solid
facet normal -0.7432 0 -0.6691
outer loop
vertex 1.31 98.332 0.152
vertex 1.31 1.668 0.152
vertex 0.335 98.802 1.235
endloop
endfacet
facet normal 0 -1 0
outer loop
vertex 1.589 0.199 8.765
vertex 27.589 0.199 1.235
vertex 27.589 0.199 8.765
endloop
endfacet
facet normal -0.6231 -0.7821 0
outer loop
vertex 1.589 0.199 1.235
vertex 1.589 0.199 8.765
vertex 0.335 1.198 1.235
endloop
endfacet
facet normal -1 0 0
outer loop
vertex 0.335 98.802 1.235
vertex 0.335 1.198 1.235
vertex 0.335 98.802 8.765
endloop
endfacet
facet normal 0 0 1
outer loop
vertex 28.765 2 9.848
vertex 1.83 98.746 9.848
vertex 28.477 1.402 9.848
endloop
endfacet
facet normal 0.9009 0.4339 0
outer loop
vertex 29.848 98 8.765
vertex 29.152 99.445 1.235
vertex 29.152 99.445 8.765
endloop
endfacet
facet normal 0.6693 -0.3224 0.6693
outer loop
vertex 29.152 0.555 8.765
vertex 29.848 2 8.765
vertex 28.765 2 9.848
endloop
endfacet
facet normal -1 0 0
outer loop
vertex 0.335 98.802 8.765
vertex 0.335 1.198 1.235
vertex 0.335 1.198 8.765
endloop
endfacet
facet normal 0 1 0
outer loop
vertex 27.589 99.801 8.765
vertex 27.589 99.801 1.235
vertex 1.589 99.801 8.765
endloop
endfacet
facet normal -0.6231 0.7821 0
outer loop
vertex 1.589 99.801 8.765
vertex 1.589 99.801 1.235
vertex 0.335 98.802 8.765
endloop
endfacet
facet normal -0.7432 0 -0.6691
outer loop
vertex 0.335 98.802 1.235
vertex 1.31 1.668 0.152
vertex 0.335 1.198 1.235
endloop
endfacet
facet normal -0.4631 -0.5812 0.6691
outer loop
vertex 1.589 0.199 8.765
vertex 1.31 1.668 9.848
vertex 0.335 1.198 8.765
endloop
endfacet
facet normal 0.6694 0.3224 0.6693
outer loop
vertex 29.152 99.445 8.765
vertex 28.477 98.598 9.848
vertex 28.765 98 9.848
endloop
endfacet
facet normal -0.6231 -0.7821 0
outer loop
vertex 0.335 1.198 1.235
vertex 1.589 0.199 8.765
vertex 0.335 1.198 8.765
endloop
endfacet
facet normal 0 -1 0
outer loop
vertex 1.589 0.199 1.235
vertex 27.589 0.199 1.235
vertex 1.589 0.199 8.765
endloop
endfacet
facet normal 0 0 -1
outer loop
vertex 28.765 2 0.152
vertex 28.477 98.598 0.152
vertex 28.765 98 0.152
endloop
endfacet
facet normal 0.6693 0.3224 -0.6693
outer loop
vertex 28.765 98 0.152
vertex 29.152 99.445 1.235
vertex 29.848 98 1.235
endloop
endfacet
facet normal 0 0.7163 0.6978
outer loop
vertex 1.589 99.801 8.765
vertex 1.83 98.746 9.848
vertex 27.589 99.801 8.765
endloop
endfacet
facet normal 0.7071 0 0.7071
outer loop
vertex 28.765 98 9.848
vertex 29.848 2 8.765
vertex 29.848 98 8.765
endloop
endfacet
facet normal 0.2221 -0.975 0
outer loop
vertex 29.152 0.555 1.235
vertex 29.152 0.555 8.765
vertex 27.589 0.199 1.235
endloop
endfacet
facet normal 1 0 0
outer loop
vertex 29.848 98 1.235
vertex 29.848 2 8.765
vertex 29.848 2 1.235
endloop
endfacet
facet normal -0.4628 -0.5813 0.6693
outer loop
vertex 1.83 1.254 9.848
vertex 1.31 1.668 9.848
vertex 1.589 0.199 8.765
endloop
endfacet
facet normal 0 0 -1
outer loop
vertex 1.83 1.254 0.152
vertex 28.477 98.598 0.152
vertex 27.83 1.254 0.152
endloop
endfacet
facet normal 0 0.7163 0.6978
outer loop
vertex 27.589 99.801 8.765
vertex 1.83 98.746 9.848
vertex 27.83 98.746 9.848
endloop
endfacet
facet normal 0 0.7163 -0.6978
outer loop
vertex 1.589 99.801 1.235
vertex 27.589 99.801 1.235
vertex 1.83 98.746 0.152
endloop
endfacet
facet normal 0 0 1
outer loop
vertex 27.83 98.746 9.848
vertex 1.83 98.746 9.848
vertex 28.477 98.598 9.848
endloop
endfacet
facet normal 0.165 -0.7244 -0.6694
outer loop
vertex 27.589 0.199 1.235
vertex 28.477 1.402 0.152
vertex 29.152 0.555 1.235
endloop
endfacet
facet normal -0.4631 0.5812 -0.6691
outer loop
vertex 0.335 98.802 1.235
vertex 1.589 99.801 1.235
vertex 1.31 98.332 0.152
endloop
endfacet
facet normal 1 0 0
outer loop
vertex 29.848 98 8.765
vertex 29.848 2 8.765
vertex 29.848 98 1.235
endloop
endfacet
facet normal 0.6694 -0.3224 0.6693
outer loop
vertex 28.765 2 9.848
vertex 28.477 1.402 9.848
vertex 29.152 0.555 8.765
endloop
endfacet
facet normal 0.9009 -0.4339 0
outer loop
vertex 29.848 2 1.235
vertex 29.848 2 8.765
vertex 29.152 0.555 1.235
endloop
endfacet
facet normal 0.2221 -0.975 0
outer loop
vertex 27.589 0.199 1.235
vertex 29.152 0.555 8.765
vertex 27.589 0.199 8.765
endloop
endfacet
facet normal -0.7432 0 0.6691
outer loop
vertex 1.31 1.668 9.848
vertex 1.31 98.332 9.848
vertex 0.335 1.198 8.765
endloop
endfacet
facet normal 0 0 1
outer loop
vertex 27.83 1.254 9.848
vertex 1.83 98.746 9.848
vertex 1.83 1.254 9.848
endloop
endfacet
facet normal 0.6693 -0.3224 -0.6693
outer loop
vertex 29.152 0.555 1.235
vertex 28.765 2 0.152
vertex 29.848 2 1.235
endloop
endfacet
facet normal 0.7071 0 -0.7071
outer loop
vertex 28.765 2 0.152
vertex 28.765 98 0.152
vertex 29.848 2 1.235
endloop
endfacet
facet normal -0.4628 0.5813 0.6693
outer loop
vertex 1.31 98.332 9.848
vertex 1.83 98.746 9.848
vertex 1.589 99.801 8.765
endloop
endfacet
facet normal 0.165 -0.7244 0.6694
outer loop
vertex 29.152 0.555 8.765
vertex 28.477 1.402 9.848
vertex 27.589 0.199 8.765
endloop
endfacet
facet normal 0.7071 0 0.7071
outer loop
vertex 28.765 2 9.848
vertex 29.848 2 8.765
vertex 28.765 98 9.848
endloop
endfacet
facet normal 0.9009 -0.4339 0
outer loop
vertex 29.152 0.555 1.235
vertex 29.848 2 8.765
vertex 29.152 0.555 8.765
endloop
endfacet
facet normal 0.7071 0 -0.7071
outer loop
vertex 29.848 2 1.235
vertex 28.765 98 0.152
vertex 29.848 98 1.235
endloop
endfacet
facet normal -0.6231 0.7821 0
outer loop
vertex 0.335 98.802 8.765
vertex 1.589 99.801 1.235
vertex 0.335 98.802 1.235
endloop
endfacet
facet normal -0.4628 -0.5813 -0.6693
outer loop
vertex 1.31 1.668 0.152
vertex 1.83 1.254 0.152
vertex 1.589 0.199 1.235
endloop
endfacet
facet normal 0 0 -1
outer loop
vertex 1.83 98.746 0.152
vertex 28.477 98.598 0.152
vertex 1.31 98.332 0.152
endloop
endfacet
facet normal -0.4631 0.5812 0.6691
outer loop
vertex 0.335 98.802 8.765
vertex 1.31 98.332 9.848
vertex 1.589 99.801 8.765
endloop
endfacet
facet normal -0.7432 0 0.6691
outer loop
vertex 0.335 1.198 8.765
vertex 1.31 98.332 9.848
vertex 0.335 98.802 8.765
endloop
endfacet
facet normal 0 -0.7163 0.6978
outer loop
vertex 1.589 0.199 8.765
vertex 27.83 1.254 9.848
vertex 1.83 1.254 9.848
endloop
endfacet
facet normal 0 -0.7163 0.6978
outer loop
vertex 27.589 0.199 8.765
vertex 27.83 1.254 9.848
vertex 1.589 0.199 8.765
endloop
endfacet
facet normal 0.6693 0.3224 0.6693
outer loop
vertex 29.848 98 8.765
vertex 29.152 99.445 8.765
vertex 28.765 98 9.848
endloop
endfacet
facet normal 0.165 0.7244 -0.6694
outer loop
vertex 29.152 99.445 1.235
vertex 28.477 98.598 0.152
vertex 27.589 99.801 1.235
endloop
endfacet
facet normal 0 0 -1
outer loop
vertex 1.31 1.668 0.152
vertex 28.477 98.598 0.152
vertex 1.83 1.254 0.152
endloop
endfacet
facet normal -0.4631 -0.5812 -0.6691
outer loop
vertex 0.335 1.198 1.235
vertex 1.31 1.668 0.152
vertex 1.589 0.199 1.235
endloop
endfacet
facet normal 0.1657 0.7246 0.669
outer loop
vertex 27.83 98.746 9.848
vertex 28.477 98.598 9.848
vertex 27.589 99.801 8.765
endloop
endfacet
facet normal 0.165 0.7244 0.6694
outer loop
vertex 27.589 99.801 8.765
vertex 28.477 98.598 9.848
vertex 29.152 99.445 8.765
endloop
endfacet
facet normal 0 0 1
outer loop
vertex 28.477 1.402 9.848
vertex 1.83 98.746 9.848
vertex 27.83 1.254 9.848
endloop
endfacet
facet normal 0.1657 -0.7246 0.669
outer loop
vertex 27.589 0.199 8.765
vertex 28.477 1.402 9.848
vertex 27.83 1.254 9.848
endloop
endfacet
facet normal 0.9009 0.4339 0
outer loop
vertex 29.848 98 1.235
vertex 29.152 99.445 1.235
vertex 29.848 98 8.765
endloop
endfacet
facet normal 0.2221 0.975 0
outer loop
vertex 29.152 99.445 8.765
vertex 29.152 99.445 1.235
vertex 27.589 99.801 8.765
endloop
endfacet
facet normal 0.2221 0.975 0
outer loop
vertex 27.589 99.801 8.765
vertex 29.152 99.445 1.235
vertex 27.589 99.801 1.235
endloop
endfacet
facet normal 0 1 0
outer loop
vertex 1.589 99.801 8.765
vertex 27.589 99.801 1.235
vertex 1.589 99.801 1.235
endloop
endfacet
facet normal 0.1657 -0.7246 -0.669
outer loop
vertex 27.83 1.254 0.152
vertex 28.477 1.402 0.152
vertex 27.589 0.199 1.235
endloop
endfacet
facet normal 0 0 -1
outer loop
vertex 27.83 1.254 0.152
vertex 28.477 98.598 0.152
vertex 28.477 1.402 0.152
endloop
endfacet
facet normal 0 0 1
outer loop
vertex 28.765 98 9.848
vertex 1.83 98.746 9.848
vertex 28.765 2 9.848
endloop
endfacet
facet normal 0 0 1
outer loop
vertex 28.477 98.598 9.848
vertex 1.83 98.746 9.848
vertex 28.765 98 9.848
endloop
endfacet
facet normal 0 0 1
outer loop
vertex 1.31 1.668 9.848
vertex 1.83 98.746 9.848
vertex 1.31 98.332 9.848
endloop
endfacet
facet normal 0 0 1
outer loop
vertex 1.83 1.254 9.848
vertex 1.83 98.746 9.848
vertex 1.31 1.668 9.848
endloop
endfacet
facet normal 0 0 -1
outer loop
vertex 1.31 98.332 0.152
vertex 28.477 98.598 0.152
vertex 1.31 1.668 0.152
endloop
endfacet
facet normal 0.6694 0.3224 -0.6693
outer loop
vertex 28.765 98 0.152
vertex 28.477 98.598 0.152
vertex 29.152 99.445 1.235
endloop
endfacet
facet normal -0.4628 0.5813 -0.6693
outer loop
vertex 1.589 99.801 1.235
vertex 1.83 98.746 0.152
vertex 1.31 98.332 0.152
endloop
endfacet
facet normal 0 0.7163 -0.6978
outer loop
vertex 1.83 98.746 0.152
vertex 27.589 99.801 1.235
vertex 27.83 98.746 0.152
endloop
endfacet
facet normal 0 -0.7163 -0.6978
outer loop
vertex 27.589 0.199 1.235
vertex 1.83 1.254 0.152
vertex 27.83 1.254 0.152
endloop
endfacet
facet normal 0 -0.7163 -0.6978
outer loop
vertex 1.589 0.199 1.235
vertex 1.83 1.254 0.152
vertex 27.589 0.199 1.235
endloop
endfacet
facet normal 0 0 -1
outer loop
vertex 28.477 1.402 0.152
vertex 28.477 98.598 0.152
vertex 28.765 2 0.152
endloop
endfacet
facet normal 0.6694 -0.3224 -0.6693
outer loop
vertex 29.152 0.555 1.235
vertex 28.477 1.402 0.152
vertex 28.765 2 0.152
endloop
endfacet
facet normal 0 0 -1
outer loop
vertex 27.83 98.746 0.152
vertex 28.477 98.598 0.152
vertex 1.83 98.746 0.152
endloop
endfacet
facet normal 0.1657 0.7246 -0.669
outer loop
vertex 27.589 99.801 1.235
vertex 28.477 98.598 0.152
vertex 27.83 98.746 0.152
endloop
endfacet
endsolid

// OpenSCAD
// $fn = 10;


module handle(w, h, d, r) {
  dia = r * 2;

  translate([r, r, r]) {
    hull() {
      for(x = [0, w-dia]) {
        for(y = [0, h-dia]) {
          for(z = [0, d-dia]) {
            translate([x, y, z]) sphere(r);
            // translate([x, y, z]) cube(r);
          }
        }
      }
    }
  }
}

handle(
  w = 30,
  h = 100,
  d = 10,
  r = 2);
